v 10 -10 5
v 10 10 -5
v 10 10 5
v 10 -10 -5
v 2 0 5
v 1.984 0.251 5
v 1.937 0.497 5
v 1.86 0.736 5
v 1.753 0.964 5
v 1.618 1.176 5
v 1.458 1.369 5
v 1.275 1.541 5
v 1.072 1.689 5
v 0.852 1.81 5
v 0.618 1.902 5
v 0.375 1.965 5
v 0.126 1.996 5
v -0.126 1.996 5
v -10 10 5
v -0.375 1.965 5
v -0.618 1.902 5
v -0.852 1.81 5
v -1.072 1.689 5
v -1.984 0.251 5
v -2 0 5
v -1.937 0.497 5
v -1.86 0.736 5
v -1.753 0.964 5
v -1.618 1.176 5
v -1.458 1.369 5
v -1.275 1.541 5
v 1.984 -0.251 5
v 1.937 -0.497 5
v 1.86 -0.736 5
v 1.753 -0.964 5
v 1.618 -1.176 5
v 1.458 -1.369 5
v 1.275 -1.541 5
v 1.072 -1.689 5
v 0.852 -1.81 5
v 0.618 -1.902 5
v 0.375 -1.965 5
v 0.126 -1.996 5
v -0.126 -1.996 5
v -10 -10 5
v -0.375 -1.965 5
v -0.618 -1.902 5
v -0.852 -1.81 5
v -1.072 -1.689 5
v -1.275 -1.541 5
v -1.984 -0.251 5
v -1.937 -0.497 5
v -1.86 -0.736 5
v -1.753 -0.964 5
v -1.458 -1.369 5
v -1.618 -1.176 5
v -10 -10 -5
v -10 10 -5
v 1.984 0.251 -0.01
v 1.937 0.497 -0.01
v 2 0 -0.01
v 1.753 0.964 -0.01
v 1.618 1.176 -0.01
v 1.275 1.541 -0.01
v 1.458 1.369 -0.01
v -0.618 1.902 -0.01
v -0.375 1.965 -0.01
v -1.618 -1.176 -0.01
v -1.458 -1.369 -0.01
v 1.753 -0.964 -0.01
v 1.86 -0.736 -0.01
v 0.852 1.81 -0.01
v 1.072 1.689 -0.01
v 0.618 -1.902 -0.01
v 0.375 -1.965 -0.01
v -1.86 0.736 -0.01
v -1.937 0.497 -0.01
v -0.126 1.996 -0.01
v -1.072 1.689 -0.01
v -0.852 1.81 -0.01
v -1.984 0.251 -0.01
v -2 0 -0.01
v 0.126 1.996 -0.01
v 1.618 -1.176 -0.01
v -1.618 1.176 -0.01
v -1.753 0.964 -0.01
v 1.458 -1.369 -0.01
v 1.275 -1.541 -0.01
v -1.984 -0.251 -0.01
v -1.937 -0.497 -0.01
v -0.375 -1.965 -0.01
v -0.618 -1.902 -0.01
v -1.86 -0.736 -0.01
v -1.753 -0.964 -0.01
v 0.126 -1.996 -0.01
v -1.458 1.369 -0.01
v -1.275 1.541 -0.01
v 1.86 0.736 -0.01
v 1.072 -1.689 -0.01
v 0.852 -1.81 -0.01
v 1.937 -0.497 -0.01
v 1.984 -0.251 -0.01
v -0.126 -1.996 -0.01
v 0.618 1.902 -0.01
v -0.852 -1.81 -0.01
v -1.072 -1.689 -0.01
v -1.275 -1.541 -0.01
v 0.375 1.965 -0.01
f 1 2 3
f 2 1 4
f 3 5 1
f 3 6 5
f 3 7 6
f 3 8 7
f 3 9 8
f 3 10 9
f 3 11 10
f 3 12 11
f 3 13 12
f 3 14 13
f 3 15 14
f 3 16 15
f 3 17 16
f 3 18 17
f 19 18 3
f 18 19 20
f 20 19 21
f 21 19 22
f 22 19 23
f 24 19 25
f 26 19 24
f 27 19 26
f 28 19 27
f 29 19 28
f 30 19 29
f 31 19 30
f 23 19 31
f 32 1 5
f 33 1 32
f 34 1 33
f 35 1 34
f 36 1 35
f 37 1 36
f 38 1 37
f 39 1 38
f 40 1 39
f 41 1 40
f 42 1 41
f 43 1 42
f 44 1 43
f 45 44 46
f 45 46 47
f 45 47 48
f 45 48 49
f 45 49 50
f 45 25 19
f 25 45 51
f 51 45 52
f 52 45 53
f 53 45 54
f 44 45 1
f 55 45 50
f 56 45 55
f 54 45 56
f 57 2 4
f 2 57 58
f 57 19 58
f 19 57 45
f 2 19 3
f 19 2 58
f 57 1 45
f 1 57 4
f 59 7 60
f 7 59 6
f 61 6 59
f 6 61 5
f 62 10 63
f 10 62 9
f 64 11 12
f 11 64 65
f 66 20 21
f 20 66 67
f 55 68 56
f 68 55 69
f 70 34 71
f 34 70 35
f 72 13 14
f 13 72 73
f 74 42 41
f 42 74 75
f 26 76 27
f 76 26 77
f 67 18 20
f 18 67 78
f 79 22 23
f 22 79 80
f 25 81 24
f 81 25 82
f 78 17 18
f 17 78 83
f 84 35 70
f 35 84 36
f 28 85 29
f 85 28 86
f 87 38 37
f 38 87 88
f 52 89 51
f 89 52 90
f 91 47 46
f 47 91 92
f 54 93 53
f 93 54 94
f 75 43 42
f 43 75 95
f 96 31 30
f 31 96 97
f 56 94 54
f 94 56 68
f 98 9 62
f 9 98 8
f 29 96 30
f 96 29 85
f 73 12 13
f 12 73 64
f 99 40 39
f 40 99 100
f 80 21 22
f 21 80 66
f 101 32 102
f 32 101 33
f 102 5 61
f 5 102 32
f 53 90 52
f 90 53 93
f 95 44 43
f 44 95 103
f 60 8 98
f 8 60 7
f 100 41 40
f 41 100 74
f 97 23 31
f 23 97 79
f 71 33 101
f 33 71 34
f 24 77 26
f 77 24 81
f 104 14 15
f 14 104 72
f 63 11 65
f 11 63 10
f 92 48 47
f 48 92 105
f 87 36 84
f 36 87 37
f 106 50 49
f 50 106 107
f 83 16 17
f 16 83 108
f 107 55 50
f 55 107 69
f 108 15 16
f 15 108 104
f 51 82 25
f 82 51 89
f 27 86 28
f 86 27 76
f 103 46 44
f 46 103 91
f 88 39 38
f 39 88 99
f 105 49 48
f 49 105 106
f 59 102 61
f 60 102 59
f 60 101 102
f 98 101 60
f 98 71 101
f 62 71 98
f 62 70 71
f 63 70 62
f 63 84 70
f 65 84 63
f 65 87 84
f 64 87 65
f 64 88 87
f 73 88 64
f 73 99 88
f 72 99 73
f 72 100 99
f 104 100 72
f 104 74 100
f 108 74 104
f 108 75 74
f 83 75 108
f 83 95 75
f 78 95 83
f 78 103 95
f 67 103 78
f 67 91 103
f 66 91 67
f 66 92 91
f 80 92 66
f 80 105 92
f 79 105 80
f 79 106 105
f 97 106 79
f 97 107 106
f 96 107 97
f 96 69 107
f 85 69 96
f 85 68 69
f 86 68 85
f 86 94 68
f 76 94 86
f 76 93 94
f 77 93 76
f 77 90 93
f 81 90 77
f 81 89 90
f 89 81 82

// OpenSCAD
// Through Hole Example
// A hole that goes completely through an object

eps = 0.01;
$fn = 50;

difference() {
    // Main body
    cube([20, 20, 10], center=true);
    
    // Through hole
    translate([0, 0, -eps])
        cylinder(h=10+2*eps, r=2);
}
